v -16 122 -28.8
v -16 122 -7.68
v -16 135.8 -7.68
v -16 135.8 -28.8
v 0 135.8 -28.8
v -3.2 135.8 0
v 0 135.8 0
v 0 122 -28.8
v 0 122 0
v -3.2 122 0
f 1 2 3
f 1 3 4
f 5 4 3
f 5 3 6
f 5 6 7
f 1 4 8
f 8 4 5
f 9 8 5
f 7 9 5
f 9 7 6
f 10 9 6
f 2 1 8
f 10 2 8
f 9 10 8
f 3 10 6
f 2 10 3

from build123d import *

# Parameters (mm, degrees)
SKETCH017_W     = 16
SKETCH017_H     = 15.8
PAD010_DEPTH    = 28.8
POCKET007_DEPTH = 16
PAD137_DEPTH    = 15.8
SKETCH190_W     = 16
SKETCH190_H     = 2
POCKET072_DEPTH = 30


with BuildPart() as part:
    # Sketch017 (on Face68 of Binder006) → Pad010 (new body)
    with BuildSketch(Plane.XY.offset(-28.8)):
        with Locations((-8, 127.9)):
            Rectangle(SKETCH017_W, SKETCH017_H)
    extrude(amount=PAD010_DEPTH)

    # Sketch018 (on Face3 of Pad010) → Pocket007 (cut)
    with BuildSketch(Plane.XZ.offset(-120)):
        Polygon((0, 0), (-16, -9.6), (-16, 0), align=None)
    extrude(amount=-POCKET007_DEPTH, mode=Mode.SUBTRACT)

    # Sketch141 (on Face6 of Pocket007) → Pad137 (join)
    with BuildSketch(Plane.XZ.offset(-120)):
        Polygon((0, 0), (-3.2, 0), (-16, -7.68), (-16, -10.88), (-3.2, -3.2), (0, -3.2), align=None)
    extrude(amount=-PAD137_DEPTH)

    # Sketch190 (on Face1 of Pad137) → Pocket072 (cut)
    with BuildSketch(Plane(origin=(0, 0, -28.8), x_dir=(1, 0, 0), z_dir=(0, 0, -1))):
        with Locations((-8, -121)):
            Rectangle(SKETCH190_W, SKETCH190_H)
    extrude(amount=-POCKET072_DEPTH, mode=Mode.SUBTRACT)


solid = part.part
